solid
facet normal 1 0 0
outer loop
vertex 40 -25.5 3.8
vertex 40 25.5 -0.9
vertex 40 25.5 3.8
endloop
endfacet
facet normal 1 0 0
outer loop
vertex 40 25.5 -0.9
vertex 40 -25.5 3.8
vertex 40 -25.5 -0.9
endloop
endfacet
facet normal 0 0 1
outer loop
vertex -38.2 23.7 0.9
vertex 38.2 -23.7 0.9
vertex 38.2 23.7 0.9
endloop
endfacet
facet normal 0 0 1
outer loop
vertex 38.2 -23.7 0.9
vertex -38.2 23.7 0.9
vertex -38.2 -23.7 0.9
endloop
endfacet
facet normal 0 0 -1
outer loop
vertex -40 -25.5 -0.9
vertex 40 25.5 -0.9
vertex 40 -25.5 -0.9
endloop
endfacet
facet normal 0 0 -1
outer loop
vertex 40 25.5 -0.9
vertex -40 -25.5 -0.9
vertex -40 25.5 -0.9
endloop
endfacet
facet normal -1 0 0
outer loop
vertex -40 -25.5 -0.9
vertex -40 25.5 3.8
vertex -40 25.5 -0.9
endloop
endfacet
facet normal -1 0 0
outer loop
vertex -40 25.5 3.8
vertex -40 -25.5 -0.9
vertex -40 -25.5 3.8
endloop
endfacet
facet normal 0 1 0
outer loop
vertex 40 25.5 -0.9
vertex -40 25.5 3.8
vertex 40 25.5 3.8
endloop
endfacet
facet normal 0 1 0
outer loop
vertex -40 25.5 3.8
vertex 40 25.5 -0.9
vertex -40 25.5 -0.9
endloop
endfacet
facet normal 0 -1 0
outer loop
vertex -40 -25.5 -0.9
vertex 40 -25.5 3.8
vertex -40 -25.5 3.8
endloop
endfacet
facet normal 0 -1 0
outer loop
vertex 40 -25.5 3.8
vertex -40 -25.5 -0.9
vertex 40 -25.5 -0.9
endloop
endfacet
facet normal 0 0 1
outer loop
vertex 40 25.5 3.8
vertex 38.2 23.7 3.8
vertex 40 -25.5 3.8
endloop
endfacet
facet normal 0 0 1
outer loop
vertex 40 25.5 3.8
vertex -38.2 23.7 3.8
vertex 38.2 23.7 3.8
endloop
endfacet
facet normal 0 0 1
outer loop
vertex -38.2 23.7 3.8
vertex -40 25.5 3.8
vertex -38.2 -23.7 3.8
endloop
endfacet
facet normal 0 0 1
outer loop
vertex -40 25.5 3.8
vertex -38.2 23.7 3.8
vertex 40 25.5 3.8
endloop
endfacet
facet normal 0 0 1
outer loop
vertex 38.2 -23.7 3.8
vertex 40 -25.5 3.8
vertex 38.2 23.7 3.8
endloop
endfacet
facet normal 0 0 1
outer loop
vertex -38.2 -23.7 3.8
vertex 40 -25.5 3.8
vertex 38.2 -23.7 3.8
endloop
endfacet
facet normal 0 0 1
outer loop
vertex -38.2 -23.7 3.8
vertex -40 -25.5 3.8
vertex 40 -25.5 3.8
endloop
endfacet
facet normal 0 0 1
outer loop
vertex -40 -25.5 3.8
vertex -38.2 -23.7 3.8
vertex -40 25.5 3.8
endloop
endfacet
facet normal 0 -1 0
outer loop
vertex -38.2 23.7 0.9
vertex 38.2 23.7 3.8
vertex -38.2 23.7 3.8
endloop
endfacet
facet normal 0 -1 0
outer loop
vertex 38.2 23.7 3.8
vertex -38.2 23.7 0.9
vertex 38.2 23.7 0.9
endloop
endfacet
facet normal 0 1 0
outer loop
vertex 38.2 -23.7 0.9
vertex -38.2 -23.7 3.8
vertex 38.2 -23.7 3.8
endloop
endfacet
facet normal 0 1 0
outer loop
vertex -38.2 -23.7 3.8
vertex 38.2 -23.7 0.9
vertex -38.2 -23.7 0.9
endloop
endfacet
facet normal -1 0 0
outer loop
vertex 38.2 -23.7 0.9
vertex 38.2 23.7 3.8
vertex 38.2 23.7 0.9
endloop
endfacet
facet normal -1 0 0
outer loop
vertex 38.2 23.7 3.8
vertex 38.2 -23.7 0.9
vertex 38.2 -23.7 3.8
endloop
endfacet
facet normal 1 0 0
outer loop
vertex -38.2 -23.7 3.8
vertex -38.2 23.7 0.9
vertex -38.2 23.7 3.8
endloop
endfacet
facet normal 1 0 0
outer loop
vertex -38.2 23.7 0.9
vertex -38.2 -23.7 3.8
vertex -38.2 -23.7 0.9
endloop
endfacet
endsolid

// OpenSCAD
/**
 * Glass Inner bottom (Ikea glass)
 * @Author Wilfried Loche
 * @Created Jan 27, 2017
 */

/* Plater size */
width = 80;
depth = 51;
thickness = 1.8;
borderHeight = 4;



cube(size=[width, depth, thickness], center=true);

translate([0, (depth-thickness)/2, thickness])
    cube(size=[width, thickness, borderHeight], center=true);
translate([0, -(depth-thickness)/2, thickness])
    cube(size=[width, thickness, borderHeight], center=true);

translate([(width-thickness)/2, 0, thickness])
    cube(size=[thickness, depth, borderHeight], center=true);
translate([-(width-thickness)/2, 0, thickness])
    cube(size=[thickness, depth, borderHeight], center=true);
